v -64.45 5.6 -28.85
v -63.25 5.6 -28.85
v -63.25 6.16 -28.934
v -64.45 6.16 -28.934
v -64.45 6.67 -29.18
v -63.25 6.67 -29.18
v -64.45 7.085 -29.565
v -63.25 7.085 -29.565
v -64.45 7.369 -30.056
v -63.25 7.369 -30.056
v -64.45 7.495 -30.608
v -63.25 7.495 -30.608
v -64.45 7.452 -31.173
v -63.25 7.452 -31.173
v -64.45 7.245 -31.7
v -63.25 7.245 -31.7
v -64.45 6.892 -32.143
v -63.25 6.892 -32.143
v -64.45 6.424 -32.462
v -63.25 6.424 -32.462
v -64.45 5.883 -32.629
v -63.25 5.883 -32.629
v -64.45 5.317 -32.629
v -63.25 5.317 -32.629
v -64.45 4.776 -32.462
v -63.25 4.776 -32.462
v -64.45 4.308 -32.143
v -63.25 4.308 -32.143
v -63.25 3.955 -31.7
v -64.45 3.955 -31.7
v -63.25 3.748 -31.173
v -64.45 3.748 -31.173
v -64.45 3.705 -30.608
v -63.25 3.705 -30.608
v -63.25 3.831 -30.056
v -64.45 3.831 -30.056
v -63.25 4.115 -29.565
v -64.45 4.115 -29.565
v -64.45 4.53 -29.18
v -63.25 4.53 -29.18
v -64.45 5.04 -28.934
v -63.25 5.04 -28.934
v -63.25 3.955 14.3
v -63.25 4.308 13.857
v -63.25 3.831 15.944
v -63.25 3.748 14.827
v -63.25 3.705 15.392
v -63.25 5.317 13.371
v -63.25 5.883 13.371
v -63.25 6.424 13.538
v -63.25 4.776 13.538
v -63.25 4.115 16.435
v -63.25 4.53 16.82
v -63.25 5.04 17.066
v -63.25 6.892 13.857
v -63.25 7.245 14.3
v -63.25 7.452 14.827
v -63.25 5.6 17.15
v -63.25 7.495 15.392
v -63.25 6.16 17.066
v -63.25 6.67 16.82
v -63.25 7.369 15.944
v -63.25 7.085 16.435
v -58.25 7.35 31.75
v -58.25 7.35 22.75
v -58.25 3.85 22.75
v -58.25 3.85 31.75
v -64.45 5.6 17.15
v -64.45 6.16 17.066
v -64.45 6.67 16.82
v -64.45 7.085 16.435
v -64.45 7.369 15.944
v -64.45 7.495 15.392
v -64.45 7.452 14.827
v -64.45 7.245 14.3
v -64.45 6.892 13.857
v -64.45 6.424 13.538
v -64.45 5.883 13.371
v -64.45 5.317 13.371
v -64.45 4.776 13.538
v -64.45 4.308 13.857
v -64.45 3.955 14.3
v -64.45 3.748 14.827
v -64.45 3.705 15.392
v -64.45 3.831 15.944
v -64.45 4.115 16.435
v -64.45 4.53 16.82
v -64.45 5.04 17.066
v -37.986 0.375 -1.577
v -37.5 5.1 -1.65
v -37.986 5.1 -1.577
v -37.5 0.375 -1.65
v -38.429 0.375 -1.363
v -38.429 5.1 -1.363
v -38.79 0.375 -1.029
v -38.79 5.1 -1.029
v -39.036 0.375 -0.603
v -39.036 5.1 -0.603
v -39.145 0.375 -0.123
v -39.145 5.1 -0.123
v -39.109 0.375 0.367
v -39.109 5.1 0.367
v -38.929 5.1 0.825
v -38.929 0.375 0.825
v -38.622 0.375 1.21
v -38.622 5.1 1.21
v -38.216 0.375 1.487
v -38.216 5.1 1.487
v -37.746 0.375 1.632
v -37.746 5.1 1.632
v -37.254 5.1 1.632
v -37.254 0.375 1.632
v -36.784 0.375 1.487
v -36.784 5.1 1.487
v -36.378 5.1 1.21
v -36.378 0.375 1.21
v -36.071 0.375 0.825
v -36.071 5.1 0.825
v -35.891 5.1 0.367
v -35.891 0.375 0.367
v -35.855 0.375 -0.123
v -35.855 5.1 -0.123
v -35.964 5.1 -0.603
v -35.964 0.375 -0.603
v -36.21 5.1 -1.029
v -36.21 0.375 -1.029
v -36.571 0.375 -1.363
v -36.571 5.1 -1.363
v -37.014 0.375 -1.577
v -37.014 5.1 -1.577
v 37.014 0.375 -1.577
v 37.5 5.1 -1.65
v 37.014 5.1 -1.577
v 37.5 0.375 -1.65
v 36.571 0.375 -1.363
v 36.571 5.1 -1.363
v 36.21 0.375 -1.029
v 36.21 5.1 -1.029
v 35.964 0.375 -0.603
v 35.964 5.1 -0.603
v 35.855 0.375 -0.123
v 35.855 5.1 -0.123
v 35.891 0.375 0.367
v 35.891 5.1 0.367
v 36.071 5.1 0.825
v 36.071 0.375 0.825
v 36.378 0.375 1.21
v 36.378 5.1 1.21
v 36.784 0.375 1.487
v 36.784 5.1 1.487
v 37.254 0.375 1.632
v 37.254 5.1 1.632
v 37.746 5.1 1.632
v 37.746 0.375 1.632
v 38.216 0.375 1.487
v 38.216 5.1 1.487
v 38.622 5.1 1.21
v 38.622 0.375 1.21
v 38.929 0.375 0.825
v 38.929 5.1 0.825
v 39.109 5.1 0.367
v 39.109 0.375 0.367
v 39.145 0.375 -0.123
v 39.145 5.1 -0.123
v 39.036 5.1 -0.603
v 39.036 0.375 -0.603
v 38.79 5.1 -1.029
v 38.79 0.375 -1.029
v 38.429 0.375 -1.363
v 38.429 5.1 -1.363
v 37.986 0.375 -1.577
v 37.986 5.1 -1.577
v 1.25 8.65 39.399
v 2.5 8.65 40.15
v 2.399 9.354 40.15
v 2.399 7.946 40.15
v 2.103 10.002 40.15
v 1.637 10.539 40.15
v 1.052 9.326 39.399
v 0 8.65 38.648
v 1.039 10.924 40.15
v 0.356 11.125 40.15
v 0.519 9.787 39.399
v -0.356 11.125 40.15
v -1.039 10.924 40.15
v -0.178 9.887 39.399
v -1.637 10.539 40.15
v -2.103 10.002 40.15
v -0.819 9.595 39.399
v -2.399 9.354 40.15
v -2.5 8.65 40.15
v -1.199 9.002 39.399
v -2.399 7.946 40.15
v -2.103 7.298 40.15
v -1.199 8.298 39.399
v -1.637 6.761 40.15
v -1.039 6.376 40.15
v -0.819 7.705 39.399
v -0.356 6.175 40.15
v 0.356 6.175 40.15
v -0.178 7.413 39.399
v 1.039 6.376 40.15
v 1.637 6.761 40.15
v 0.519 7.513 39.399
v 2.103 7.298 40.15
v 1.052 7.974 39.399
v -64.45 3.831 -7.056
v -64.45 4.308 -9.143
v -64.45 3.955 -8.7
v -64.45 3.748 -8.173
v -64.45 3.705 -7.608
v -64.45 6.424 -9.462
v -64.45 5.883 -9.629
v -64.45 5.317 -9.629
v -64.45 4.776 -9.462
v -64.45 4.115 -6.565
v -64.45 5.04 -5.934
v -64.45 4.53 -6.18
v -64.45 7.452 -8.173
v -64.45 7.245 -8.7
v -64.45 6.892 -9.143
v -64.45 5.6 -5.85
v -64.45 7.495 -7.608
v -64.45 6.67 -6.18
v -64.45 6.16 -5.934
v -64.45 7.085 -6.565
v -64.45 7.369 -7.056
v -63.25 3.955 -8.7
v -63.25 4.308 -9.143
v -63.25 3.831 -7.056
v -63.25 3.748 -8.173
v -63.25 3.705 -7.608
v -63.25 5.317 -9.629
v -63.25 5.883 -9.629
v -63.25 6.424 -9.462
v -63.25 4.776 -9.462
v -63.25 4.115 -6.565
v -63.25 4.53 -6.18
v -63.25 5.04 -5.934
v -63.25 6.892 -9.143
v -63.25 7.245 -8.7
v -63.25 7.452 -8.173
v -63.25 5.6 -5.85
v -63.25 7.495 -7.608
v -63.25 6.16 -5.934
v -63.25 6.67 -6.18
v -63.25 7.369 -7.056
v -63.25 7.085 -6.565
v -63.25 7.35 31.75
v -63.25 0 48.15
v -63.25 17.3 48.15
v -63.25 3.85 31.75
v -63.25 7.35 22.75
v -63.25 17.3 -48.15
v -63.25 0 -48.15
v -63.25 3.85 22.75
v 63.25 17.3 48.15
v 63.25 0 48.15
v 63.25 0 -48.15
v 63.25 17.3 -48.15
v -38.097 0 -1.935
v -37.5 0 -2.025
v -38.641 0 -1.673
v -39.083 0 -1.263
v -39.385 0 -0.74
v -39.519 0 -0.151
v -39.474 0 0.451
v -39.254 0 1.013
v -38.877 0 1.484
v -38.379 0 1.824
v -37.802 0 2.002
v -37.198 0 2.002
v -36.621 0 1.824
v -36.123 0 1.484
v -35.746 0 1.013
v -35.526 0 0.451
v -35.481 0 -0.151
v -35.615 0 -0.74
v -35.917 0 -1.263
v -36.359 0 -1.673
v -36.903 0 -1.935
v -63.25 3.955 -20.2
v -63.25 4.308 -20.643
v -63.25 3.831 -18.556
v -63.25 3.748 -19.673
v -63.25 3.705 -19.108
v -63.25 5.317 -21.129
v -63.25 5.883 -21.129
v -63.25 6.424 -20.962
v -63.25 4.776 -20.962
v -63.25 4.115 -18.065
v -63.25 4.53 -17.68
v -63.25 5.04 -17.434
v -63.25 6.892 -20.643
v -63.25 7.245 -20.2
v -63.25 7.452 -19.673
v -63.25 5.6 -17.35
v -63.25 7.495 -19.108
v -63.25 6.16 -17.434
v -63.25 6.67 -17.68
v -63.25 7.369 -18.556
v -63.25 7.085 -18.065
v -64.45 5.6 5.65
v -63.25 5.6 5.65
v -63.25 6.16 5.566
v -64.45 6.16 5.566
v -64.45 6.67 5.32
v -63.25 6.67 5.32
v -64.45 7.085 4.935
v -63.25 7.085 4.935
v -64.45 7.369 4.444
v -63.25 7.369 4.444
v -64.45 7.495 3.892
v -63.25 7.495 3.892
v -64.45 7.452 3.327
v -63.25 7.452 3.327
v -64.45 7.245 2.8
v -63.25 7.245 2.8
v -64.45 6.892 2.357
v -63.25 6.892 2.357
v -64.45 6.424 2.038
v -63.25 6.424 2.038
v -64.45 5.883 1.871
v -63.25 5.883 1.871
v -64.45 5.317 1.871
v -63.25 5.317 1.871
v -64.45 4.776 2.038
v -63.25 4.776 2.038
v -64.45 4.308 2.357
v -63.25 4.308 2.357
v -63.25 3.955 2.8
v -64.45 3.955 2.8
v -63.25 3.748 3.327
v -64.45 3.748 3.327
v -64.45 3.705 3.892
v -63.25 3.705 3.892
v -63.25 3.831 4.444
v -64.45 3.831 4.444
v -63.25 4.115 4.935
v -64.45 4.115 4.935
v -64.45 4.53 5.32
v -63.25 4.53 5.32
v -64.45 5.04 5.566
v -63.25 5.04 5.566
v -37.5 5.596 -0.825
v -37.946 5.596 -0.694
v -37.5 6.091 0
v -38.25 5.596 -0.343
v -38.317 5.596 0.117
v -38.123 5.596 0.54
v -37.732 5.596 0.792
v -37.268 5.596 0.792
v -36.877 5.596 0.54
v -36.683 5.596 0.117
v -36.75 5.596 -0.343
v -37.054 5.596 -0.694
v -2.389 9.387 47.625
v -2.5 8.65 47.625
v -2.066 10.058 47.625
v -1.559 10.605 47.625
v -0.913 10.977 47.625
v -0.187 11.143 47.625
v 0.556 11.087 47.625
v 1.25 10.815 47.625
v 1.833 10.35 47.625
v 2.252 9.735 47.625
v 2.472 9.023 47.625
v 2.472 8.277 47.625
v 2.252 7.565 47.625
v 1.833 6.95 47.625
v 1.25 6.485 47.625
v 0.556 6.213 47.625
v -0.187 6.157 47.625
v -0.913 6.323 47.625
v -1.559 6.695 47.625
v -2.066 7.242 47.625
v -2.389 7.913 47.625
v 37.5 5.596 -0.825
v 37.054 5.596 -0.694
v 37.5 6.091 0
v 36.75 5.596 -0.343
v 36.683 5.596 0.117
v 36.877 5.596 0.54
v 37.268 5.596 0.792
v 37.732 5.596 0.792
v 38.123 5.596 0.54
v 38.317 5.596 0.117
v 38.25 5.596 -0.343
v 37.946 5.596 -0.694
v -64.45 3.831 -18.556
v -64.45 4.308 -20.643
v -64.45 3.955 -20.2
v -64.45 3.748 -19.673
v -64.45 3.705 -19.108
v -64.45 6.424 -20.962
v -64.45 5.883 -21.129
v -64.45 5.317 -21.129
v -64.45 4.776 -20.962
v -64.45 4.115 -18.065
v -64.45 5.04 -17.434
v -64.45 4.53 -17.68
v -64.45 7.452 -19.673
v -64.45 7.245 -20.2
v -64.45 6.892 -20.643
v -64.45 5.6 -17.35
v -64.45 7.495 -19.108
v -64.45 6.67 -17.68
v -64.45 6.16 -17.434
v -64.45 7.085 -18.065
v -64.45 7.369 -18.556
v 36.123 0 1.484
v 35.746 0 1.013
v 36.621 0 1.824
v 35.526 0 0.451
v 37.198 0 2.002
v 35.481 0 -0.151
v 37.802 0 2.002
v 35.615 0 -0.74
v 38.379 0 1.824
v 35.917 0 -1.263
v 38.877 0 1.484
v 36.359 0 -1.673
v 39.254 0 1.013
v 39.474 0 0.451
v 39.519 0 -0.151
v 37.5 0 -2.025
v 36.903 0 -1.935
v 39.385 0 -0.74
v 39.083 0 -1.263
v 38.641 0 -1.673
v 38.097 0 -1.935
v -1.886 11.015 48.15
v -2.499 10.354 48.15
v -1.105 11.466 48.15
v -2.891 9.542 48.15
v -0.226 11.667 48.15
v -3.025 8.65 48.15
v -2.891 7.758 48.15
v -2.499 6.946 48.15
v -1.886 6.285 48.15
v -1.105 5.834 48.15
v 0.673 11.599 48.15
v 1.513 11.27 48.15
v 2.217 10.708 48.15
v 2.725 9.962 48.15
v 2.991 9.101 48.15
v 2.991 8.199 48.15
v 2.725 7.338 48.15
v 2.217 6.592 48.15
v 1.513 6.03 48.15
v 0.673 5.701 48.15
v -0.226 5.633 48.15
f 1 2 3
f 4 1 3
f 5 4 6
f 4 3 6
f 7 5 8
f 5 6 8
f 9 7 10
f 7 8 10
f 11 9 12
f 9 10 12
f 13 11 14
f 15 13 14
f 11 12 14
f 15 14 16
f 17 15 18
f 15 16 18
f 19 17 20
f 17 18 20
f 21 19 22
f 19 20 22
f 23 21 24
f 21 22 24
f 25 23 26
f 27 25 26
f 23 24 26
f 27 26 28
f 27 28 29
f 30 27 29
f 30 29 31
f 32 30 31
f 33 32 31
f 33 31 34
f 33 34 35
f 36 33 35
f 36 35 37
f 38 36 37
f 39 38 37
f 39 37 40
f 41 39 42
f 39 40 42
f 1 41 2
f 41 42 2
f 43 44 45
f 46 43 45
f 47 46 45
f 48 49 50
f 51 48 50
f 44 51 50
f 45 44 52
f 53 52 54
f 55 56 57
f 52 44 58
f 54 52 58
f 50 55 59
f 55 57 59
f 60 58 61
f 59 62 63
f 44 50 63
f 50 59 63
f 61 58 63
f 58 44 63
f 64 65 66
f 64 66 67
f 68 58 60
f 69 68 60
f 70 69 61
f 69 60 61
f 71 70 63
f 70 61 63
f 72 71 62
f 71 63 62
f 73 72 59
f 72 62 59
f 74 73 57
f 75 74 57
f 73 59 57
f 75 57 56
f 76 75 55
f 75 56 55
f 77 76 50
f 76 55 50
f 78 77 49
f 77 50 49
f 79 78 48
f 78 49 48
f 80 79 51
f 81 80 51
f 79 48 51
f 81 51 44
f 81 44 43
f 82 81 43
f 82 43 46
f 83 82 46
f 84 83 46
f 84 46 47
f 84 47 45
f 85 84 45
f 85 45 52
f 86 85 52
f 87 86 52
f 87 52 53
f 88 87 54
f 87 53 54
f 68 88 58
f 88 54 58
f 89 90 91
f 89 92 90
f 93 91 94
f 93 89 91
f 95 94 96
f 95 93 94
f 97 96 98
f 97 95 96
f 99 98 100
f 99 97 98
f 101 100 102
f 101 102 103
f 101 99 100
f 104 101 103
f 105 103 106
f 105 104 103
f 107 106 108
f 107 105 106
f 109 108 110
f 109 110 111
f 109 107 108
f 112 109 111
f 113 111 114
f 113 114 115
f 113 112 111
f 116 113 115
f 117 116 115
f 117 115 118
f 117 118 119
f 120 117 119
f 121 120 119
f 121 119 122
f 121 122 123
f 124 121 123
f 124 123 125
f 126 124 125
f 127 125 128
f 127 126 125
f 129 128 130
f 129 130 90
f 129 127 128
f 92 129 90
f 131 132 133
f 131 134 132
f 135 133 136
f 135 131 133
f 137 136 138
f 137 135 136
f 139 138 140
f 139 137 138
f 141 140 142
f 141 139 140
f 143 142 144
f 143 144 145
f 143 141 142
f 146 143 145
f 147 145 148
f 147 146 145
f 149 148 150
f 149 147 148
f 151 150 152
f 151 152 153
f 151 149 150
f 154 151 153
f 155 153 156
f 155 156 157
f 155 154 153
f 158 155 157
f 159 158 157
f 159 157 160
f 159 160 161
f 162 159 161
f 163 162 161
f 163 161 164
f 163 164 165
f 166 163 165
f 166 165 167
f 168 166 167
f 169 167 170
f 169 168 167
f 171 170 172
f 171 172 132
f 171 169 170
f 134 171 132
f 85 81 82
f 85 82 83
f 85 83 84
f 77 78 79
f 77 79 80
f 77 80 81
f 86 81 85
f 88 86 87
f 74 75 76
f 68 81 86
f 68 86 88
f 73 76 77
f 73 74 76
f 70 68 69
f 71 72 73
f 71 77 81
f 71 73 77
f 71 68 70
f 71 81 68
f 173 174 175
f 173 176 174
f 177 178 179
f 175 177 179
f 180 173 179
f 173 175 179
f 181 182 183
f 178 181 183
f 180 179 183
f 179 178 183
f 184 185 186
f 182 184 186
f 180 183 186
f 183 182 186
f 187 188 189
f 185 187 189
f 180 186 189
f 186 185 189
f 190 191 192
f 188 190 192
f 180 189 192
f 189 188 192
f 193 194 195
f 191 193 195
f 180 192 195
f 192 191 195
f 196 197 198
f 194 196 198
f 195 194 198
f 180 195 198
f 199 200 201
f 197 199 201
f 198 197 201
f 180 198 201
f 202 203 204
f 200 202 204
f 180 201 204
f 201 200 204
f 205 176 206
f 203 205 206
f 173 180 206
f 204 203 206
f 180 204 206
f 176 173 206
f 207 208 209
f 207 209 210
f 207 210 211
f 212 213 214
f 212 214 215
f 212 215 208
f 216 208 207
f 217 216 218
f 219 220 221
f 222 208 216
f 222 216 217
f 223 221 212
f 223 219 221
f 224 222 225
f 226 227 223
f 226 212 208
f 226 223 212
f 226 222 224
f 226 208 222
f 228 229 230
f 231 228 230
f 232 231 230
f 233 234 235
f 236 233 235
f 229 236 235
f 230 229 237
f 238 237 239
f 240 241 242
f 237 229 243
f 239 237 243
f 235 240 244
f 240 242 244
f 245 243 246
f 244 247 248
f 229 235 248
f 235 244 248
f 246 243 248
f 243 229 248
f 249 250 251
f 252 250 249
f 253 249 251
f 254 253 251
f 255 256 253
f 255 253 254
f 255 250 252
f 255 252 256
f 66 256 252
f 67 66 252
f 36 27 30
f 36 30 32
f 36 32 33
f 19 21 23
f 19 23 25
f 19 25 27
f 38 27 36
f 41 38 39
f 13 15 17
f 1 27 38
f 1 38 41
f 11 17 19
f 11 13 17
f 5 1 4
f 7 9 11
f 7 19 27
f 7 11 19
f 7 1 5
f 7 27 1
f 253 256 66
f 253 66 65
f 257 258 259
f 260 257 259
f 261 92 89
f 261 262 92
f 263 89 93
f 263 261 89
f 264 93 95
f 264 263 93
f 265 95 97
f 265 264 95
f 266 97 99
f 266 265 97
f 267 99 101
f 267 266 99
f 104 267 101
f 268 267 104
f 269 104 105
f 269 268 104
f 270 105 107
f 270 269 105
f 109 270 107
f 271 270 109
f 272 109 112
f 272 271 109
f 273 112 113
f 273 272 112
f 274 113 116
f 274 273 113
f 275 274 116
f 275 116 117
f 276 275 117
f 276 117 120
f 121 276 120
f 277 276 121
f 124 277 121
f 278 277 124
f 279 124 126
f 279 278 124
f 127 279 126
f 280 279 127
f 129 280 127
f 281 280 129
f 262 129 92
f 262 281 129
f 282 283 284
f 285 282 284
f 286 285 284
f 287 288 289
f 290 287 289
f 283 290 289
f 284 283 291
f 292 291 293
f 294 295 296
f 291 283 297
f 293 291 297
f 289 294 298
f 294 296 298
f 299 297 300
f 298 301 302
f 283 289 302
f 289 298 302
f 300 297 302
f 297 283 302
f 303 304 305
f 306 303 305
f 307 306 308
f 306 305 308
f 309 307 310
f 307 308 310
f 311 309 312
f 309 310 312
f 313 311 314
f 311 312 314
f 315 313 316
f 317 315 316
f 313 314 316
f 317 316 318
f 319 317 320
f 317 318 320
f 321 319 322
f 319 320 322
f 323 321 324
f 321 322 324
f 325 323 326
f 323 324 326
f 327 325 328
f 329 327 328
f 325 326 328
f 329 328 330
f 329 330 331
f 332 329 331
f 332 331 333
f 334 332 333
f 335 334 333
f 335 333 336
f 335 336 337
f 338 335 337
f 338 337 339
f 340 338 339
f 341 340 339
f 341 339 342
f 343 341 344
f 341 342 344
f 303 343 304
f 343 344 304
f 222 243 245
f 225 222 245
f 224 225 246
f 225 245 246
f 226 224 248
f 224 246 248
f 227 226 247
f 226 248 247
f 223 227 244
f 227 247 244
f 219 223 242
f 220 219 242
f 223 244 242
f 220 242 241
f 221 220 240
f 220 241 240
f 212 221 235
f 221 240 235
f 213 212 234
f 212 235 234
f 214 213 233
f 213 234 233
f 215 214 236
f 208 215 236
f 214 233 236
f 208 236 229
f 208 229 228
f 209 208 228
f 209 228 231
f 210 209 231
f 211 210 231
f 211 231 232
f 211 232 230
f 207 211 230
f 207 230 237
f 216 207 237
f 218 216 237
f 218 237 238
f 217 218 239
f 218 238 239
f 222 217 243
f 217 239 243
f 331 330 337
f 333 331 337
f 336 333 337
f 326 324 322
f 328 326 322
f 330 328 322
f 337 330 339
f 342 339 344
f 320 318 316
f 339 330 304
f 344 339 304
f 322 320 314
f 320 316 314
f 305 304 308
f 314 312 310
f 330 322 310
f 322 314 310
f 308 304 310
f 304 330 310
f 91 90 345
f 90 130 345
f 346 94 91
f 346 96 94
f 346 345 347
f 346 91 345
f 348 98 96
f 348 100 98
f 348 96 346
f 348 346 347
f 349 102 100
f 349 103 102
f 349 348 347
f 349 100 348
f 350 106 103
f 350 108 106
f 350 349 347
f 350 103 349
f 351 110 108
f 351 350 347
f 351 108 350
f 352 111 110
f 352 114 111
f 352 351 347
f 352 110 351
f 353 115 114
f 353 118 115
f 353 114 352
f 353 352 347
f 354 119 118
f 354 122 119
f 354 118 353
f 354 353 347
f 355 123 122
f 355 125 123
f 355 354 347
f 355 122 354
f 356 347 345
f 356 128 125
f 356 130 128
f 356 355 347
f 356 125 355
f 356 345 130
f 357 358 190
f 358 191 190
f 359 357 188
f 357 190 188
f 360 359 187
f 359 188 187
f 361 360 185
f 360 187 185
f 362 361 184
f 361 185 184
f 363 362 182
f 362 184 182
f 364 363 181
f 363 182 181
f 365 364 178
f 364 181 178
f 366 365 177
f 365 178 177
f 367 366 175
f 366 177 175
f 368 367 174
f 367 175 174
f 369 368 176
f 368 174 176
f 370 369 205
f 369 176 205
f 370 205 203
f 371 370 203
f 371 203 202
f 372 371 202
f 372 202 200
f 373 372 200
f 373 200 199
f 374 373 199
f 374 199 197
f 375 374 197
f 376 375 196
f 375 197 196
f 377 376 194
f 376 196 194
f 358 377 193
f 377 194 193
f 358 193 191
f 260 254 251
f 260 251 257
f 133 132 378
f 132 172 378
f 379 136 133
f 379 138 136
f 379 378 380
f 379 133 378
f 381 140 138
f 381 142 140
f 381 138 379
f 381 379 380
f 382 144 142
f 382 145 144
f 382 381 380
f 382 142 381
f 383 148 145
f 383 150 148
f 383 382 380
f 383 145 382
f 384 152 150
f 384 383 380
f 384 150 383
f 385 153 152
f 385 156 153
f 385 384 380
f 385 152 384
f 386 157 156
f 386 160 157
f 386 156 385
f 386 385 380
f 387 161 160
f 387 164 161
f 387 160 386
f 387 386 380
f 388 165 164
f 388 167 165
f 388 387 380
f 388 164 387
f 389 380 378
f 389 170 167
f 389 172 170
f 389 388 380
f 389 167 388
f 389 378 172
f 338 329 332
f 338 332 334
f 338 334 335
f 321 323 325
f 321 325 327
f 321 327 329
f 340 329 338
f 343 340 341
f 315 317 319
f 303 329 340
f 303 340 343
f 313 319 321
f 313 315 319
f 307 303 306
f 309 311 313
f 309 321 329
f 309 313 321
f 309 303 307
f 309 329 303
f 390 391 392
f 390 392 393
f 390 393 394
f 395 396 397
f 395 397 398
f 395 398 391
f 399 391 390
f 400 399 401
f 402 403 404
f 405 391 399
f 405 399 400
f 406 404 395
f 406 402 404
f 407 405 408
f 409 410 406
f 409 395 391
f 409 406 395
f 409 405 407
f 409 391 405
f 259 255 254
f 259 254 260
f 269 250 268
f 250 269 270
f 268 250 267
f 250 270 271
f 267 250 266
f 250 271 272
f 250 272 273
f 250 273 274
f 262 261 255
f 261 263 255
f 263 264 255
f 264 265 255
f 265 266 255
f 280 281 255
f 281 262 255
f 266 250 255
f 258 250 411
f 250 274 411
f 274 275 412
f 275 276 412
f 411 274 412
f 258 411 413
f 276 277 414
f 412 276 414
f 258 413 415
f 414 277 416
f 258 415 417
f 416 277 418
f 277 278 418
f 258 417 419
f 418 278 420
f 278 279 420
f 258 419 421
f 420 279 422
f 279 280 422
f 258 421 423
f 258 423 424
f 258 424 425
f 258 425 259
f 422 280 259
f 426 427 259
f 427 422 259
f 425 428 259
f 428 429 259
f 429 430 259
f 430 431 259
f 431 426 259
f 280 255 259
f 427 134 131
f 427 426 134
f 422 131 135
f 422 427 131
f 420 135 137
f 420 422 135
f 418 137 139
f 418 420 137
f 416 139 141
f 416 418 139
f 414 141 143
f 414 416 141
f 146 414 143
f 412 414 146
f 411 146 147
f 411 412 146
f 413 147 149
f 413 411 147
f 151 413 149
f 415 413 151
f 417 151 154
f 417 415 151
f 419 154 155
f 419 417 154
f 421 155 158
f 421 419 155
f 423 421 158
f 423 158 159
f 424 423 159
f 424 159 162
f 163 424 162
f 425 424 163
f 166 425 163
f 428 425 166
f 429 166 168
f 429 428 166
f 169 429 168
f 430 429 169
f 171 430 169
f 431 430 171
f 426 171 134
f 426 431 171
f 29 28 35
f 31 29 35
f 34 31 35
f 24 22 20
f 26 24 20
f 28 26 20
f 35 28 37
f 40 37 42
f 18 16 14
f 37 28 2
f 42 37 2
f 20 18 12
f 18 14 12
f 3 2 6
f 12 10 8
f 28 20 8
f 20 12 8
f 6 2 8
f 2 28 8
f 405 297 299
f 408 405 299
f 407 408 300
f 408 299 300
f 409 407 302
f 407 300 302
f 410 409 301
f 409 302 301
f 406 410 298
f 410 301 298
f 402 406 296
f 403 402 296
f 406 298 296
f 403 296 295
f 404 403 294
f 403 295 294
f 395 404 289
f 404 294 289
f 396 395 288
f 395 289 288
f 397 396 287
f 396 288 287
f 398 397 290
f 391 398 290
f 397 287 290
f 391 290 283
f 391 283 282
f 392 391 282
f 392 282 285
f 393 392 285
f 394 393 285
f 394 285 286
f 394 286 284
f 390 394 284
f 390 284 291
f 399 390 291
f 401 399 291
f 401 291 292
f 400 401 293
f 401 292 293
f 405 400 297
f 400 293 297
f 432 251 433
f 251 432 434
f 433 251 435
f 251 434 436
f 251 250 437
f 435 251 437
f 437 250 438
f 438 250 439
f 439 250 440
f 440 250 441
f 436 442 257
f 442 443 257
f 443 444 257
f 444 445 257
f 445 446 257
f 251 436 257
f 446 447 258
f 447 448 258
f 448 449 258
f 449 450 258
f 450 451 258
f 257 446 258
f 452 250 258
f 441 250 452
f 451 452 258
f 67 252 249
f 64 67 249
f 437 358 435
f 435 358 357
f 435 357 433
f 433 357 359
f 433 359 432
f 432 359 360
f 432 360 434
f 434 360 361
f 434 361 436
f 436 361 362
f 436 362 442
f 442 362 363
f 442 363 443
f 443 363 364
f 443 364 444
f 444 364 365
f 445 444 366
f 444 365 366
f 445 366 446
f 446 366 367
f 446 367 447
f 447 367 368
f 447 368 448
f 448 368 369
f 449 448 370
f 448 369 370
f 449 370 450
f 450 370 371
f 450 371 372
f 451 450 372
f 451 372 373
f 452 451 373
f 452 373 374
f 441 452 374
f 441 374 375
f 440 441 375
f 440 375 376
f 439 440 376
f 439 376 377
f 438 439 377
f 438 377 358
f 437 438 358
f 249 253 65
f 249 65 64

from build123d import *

# Parameters (mm, degrees)
SKETCH_1_W                   = 126.5
SKETCH_1_H                   = 96.3
EXTRUDE_1_DEPTH              = 17.3
HOLE_WIZARD_M6_1_D           = 5
HOLE_WIZARD_M6_1_DEPTH       = 8
HOLE_WIZARD_M6_1_CSINK_D     = 6.05
HOLE_WIZARD_M6_1_CSINK_ANGLE = 90
HOLE_WIZARD_M6_1_TIP         = 1.502151548
SKETCH_4_R                   = 1.9
EXTRUDE_2_DEPTH              = 1.2
EXTRUDE_2_2_DEPTH            = 1.2
EXTRUDE_2_3_DEPTH            = 1.2
EXTRUDE_2_4_DEPTH            = 1.2
EXTRUDE_2_5_DEPTH            = 1.2
SKETCH_5_W                   = 9
SKETCH_5_H                   = 3.5
CUT_EXTRUDE_1_DEPTH          = 5
HOLE_WIZARD_M4_1_AT_2_COUNT  = 2
HOLE_WIZARD_M4_1_AT_2_PITCH  = 75


with BuildPart() as part:
    # 草图1 → 凸台-拉伸1 (new body)
    with BuildSketch(Plane(origin=(0, 0, 0), x_dir=(1, 0, 0), z_dir=(0, 1, 0))):
        Rectangle(SKETCH_1_W, SKETCH_1_H)
    extrude(amount=EXTRUDE_1_DEPTH)

    # M6 螺纹孔1
    with Locations(Plane.XY.offset(48.15)):
        with Locations((0, 8.65)):
            CounterSinkHole(HOLE_WIZARD_M6_1_D / 2, HOLE_WIZARD_M6_1_CSINK_D / 2, depth=HOLE_WIZARD_M6_1_DEPTH, counter_sink_angle=HOLE_WIZARD_M6_1_CSINK_ANGLE)
            with Locations((0, 0, -(HOLE_WIZARD_M6_1_DEPTH + HOLE_WIZARD_M6_1_TIP / 2))):  # 118° drill point
                Cone(0, HOLE_WIZARD_M6_1_D / 2, HOLE_WIZARD_M6_1_TIP, mode=Mode.SUBTRACT)

    # 草图5 → 切除-拉伸1 (cut)
    with BuildSketch(Plane.ZY.offset(63.25)):
        with Locations((27.25, 5.6)):
            Rectangle(SKETCH_5_W, SKETCH_5_H)
    extrude(amount=-CUT_EXTRUDE_1_DEPTH, mode=Mode.SUBTRACT)

    # 草图7 → M4 螺纹孔1 (revolve, cut)
    with BuildSketch(Plane(origin=(37.5, 0, 0), x_dir=(0, 0, -1), z_dir=(1, 0, 0))):
        Polygon((0, 0), (0, 6.091420021), (1.65, 5.1), (1.65, 0.375), (2.025, 0), align=None)
    hole_wizard_m4_1 = revolve(axis=Axis((37.5, -6.35, 0), (0, 1, 0)), mode=Mode.SUBTRACT)

    # M4 螺纹孔1 at 2: M4 螺纹孔1 ×2
    with Locations(*[(-i * HOLE_WIZARD_M4_1_AT_2_PITCH, 0, 0) for i in range(1, HOLE_WIZARD_M4_1_AT_2_COUNT)]):
        add(hole_wizard_m4_1, mode=Mode.SUBTRACT)


with BuildPart() as body_2:
    # 草图4 → 凸台-拉伸2 (new body)
    with BuildSketch(Plane.ZY.offset(63.25)):
        with Locations((-30.75, 5.6)):
            Circle(SKETCH_4_R)
    extrude(amount=EXTRUDE_2_DEPTH)


with BuildPart() as body_3:
    # 草图4 → Extrude 2 2 (new body)
    with BuildSketch(Plane.ZY.offset(63.25)):
        with Locations((-19.25, 5.6)):
            Circle(SKETCH_4_R)
    extrude(amount=EXTRUDE_2_2_DEPTH)


with BuildPart() as body_4:
    # 草图4 → Extrude 2 3 (new body)
    with BuildSketch(Plane.ZY.offset(63.25)):
        with Locations((-7.75, 5.6)):
            Circle(SKETCH_4_R)
    extrude(amount=EXTRUDE_2_3_DEPTH)


with BuildPart() as body_5:
    # 草图4 → Extrude 2 4 (new body)
    with BuildSketch(Plane.ZY.offset(63.25)):
        with Locations((3.75, 5.6)):
            Circle(SKETCH_4_R)
    extrude(amount=EXTRUDE_2_4_DEPTH)


with BuildPart() as body_6:
    # 草图4 → Extrude 2 5 (new body)
    with BuildSketch(Plane.ZY.offset(63.25)):
        with Locations((15.25, 5.6)):
            Circle(SKETCH_4_R)
    extrude(amount=EXTRUDE_2_5_DEPTH)


solid = Compound([part.part, body_2.part, body_3.part, body_4.part, body_5.part, body_6.part])
